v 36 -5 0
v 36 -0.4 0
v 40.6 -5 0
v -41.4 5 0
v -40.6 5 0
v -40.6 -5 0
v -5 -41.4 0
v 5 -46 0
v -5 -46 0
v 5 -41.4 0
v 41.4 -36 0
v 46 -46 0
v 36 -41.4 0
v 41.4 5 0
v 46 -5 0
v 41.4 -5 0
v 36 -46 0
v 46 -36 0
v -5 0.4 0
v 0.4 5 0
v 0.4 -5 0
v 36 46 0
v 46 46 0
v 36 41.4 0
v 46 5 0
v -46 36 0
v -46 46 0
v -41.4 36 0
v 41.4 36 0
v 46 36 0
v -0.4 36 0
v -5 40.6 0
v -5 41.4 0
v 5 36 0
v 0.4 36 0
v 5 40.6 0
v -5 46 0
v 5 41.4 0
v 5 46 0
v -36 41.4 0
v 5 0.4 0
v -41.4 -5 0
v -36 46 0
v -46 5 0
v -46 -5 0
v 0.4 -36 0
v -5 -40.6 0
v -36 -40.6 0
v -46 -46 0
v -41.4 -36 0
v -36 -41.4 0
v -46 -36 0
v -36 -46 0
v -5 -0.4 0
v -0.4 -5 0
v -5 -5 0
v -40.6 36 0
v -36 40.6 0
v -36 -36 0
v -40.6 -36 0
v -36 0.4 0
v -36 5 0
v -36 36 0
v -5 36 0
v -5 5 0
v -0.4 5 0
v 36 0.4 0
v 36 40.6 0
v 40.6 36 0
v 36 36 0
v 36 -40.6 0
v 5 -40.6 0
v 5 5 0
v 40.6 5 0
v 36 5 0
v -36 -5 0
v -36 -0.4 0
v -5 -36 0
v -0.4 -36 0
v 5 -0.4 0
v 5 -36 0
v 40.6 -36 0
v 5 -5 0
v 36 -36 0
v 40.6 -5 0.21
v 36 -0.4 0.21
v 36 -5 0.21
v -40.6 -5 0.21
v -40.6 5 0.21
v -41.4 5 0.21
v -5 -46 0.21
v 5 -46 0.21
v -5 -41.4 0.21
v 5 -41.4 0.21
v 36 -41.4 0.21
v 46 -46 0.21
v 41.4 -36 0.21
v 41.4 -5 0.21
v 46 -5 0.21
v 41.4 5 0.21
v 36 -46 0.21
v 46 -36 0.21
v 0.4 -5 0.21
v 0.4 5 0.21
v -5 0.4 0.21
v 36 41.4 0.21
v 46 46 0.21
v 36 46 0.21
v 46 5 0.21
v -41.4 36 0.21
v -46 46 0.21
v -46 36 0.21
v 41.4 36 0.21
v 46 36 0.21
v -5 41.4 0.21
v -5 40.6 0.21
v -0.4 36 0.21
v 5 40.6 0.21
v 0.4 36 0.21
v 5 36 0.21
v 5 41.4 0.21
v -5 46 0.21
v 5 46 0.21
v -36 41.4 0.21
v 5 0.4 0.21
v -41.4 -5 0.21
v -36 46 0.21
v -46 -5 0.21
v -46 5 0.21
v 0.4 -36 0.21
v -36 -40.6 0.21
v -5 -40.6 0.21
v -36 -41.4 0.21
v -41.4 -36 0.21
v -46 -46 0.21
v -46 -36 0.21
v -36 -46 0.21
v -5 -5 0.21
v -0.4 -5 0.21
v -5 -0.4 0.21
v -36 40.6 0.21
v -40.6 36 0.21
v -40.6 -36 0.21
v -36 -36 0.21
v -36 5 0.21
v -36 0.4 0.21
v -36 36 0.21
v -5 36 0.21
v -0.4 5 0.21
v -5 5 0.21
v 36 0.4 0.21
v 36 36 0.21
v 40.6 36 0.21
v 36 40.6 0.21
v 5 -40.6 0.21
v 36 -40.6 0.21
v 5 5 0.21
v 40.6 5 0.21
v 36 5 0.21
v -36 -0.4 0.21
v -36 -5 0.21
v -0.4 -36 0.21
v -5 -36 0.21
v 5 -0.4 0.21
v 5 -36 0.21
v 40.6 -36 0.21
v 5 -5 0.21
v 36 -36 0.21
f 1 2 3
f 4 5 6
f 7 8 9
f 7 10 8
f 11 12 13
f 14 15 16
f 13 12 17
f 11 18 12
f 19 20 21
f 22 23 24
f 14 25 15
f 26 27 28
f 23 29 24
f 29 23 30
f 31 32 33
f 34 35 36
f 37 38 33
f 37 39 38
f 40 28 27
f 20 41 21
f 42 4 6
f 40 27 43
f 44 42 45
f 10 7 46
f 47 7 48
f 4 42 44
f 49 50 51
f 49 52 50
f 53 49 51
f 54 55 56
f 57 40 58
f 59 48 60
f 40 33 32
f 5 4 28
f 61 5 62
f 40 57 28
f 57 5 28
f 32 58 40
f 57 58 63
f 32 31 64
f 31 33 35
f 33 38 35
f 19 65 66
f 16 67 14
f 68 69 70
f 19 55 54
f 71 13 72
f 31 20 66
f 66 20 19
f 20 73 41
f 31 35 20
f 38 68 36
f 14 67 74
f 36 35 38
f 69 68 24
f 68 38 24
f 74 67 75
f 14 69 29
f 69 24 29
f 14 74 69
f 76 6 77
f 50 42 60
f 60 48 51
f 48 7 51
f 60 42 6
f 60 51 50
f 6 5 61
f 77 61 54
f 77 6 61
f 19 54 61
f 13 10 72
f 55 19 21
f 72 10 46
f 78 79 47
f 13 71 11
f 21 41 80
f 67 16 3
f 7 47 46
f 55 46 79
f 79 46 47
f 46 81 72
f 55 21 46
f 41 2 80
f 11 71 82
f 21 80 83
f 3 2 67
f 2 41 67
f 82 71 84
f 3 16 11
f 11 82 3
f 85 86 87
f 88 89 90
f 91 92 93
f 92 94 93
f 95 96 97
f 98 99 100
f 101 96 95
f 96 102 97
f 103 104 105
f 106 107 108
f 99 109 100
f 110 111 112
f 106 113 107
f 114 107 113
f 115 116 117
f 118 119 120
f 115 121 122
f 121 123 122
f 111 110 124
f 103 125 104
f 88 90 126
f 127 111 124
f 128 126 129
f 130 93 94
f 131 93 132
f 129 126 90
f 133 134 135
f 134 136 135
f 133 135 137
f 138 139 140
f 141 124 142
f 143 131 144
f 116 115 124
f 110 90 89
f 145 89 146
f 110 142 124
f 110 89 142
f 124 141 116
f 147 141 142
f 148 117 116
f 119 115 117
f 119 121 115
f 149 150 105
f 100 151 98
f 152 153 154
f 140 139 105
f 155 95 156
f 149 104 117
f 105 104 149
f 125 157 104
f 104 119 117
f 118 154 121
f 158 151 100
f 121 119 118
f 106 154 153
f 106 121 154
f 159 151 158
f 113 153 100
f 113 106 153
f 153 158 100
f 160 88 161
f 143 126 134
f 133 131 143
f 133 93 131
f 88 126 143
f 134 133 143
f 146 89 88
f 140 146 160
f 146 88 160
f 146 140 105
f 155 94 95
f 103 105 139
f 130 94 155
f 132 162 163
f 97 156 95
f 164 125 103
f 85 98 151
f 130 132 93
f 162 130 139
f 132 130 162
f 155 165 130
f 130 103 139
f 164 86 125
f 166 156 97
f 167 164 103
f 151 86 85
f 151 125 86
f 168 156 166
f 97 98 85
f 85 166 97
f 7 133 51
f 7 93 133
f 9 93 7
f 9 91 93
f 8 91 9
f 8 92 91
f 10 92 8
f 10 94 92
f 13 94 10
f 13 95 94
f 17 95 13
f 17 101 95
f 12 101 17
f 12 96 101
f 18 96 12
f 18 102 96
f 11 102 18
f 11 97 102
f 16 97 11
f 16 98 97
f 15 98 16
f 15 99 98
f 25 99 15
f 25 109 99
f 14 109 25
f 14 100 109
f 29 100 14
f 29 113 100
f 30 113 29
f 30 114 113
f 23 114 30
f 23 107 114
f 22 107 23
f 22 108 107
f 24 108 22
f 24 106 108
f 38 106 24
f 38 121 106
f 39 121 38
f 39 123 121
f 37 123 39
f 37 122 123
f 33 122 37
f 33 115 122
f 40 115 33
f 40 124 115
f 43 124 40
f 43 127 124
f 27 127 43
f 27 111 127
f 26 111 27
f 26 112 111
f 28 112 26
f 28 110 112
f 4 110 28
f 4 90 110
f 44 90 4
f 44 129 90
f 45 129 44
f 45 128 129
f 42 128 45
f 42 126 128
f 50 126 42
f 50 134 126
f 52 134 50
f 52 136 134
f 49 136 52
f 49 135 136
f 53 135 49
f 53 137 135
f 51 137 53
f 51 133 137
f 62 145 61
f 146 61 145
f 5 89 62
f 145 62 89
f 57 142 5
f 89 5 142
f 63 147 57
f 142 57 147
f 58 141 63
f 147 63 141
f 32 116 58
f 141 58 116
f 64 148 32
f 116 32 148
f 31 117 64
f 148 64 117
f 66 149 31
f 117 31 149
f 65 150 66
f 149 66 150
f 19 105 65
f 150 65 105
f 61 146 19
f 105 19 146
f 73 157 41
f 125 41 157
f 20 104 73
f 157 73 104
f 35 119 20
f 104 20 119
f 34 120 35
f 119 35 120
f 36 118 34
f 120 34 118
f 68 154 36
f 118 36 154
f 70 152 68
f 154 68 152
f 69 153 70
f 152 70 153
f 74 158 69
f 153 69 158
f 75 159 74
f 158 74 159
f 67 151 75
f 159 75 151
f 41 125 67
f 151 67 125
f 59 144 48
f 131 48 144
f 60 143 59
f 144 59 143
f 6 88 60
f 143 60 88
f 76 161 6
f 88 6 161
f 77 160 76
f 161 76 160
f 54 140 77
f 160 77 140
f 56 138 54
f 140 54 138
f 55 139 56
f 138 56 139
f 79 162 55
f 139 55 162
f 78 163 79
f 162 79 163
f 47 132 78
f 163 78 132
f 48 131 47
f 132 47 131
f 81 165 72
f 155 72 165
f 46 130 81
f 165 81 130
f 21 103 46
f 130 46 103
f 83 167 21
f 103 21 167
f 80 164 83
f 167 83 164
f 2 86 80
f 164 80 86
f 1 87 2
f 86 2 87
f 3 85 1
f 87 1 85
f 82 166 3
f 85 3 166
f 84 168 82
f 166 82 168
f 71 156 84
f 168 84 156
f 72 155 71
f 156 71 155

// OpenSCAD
// Bed Level
// 5@axes
// Size must be set to 100/100 final shape will be scaled by the plugin 

$fn = 40;

bed_width = 100;
bed_depth = 100;
bed_border = 4;
square_xcount = 3;
square_ycount = 3;
square_size = 10;
line_width = 0.8;
thickness = 0.21;


// Build plate size
print_width = bed_width - square_size - (2*bed_border);
print_depth = bed_depth - square_size - (2*bed_border);


translate([-bed_width*0.5, -bed_depth*0.5, 0]) linear_extrude(height = thickness) { 
    // translate everything to center in print area
    translate([(square_size/2)+bed_border,(square_size/2)+bed_border,0]){
        // intervals between printed shapes
        incremenx = print_width / (square_xcount-1);
        incremeny = print_depth / (square_ycount-1);

        // draw connection lines along X axis
        for(curr_x = [0:square_xcount-1]){
            translate([center_x, print_depth/2, 0]){
                square([line_width,print_depth], true);
            }
            center_x = curr_x * incremenx;
        }
        // draw connection lines along Y axis
        for(curr_y = [0:square_ycount-1]){
            translate([print_width/2, center_y, 0]){
                square([print_width, line_width], true);
            }
            center_y = curr_y * incremeny;
        }
        // draw square shapes
        for(curr_x = [0:square_xcount-1]){
            for(curr_y = [0:square_ycount-1]){
                translate([center_x,center_y]){
                    square([square_size,square_size],true);
                    //circle(d=square_size);
                }
                center_y = curr_y * incremeny;
            }
            center_x = curr_x * incremenx;
        }
    }
}
